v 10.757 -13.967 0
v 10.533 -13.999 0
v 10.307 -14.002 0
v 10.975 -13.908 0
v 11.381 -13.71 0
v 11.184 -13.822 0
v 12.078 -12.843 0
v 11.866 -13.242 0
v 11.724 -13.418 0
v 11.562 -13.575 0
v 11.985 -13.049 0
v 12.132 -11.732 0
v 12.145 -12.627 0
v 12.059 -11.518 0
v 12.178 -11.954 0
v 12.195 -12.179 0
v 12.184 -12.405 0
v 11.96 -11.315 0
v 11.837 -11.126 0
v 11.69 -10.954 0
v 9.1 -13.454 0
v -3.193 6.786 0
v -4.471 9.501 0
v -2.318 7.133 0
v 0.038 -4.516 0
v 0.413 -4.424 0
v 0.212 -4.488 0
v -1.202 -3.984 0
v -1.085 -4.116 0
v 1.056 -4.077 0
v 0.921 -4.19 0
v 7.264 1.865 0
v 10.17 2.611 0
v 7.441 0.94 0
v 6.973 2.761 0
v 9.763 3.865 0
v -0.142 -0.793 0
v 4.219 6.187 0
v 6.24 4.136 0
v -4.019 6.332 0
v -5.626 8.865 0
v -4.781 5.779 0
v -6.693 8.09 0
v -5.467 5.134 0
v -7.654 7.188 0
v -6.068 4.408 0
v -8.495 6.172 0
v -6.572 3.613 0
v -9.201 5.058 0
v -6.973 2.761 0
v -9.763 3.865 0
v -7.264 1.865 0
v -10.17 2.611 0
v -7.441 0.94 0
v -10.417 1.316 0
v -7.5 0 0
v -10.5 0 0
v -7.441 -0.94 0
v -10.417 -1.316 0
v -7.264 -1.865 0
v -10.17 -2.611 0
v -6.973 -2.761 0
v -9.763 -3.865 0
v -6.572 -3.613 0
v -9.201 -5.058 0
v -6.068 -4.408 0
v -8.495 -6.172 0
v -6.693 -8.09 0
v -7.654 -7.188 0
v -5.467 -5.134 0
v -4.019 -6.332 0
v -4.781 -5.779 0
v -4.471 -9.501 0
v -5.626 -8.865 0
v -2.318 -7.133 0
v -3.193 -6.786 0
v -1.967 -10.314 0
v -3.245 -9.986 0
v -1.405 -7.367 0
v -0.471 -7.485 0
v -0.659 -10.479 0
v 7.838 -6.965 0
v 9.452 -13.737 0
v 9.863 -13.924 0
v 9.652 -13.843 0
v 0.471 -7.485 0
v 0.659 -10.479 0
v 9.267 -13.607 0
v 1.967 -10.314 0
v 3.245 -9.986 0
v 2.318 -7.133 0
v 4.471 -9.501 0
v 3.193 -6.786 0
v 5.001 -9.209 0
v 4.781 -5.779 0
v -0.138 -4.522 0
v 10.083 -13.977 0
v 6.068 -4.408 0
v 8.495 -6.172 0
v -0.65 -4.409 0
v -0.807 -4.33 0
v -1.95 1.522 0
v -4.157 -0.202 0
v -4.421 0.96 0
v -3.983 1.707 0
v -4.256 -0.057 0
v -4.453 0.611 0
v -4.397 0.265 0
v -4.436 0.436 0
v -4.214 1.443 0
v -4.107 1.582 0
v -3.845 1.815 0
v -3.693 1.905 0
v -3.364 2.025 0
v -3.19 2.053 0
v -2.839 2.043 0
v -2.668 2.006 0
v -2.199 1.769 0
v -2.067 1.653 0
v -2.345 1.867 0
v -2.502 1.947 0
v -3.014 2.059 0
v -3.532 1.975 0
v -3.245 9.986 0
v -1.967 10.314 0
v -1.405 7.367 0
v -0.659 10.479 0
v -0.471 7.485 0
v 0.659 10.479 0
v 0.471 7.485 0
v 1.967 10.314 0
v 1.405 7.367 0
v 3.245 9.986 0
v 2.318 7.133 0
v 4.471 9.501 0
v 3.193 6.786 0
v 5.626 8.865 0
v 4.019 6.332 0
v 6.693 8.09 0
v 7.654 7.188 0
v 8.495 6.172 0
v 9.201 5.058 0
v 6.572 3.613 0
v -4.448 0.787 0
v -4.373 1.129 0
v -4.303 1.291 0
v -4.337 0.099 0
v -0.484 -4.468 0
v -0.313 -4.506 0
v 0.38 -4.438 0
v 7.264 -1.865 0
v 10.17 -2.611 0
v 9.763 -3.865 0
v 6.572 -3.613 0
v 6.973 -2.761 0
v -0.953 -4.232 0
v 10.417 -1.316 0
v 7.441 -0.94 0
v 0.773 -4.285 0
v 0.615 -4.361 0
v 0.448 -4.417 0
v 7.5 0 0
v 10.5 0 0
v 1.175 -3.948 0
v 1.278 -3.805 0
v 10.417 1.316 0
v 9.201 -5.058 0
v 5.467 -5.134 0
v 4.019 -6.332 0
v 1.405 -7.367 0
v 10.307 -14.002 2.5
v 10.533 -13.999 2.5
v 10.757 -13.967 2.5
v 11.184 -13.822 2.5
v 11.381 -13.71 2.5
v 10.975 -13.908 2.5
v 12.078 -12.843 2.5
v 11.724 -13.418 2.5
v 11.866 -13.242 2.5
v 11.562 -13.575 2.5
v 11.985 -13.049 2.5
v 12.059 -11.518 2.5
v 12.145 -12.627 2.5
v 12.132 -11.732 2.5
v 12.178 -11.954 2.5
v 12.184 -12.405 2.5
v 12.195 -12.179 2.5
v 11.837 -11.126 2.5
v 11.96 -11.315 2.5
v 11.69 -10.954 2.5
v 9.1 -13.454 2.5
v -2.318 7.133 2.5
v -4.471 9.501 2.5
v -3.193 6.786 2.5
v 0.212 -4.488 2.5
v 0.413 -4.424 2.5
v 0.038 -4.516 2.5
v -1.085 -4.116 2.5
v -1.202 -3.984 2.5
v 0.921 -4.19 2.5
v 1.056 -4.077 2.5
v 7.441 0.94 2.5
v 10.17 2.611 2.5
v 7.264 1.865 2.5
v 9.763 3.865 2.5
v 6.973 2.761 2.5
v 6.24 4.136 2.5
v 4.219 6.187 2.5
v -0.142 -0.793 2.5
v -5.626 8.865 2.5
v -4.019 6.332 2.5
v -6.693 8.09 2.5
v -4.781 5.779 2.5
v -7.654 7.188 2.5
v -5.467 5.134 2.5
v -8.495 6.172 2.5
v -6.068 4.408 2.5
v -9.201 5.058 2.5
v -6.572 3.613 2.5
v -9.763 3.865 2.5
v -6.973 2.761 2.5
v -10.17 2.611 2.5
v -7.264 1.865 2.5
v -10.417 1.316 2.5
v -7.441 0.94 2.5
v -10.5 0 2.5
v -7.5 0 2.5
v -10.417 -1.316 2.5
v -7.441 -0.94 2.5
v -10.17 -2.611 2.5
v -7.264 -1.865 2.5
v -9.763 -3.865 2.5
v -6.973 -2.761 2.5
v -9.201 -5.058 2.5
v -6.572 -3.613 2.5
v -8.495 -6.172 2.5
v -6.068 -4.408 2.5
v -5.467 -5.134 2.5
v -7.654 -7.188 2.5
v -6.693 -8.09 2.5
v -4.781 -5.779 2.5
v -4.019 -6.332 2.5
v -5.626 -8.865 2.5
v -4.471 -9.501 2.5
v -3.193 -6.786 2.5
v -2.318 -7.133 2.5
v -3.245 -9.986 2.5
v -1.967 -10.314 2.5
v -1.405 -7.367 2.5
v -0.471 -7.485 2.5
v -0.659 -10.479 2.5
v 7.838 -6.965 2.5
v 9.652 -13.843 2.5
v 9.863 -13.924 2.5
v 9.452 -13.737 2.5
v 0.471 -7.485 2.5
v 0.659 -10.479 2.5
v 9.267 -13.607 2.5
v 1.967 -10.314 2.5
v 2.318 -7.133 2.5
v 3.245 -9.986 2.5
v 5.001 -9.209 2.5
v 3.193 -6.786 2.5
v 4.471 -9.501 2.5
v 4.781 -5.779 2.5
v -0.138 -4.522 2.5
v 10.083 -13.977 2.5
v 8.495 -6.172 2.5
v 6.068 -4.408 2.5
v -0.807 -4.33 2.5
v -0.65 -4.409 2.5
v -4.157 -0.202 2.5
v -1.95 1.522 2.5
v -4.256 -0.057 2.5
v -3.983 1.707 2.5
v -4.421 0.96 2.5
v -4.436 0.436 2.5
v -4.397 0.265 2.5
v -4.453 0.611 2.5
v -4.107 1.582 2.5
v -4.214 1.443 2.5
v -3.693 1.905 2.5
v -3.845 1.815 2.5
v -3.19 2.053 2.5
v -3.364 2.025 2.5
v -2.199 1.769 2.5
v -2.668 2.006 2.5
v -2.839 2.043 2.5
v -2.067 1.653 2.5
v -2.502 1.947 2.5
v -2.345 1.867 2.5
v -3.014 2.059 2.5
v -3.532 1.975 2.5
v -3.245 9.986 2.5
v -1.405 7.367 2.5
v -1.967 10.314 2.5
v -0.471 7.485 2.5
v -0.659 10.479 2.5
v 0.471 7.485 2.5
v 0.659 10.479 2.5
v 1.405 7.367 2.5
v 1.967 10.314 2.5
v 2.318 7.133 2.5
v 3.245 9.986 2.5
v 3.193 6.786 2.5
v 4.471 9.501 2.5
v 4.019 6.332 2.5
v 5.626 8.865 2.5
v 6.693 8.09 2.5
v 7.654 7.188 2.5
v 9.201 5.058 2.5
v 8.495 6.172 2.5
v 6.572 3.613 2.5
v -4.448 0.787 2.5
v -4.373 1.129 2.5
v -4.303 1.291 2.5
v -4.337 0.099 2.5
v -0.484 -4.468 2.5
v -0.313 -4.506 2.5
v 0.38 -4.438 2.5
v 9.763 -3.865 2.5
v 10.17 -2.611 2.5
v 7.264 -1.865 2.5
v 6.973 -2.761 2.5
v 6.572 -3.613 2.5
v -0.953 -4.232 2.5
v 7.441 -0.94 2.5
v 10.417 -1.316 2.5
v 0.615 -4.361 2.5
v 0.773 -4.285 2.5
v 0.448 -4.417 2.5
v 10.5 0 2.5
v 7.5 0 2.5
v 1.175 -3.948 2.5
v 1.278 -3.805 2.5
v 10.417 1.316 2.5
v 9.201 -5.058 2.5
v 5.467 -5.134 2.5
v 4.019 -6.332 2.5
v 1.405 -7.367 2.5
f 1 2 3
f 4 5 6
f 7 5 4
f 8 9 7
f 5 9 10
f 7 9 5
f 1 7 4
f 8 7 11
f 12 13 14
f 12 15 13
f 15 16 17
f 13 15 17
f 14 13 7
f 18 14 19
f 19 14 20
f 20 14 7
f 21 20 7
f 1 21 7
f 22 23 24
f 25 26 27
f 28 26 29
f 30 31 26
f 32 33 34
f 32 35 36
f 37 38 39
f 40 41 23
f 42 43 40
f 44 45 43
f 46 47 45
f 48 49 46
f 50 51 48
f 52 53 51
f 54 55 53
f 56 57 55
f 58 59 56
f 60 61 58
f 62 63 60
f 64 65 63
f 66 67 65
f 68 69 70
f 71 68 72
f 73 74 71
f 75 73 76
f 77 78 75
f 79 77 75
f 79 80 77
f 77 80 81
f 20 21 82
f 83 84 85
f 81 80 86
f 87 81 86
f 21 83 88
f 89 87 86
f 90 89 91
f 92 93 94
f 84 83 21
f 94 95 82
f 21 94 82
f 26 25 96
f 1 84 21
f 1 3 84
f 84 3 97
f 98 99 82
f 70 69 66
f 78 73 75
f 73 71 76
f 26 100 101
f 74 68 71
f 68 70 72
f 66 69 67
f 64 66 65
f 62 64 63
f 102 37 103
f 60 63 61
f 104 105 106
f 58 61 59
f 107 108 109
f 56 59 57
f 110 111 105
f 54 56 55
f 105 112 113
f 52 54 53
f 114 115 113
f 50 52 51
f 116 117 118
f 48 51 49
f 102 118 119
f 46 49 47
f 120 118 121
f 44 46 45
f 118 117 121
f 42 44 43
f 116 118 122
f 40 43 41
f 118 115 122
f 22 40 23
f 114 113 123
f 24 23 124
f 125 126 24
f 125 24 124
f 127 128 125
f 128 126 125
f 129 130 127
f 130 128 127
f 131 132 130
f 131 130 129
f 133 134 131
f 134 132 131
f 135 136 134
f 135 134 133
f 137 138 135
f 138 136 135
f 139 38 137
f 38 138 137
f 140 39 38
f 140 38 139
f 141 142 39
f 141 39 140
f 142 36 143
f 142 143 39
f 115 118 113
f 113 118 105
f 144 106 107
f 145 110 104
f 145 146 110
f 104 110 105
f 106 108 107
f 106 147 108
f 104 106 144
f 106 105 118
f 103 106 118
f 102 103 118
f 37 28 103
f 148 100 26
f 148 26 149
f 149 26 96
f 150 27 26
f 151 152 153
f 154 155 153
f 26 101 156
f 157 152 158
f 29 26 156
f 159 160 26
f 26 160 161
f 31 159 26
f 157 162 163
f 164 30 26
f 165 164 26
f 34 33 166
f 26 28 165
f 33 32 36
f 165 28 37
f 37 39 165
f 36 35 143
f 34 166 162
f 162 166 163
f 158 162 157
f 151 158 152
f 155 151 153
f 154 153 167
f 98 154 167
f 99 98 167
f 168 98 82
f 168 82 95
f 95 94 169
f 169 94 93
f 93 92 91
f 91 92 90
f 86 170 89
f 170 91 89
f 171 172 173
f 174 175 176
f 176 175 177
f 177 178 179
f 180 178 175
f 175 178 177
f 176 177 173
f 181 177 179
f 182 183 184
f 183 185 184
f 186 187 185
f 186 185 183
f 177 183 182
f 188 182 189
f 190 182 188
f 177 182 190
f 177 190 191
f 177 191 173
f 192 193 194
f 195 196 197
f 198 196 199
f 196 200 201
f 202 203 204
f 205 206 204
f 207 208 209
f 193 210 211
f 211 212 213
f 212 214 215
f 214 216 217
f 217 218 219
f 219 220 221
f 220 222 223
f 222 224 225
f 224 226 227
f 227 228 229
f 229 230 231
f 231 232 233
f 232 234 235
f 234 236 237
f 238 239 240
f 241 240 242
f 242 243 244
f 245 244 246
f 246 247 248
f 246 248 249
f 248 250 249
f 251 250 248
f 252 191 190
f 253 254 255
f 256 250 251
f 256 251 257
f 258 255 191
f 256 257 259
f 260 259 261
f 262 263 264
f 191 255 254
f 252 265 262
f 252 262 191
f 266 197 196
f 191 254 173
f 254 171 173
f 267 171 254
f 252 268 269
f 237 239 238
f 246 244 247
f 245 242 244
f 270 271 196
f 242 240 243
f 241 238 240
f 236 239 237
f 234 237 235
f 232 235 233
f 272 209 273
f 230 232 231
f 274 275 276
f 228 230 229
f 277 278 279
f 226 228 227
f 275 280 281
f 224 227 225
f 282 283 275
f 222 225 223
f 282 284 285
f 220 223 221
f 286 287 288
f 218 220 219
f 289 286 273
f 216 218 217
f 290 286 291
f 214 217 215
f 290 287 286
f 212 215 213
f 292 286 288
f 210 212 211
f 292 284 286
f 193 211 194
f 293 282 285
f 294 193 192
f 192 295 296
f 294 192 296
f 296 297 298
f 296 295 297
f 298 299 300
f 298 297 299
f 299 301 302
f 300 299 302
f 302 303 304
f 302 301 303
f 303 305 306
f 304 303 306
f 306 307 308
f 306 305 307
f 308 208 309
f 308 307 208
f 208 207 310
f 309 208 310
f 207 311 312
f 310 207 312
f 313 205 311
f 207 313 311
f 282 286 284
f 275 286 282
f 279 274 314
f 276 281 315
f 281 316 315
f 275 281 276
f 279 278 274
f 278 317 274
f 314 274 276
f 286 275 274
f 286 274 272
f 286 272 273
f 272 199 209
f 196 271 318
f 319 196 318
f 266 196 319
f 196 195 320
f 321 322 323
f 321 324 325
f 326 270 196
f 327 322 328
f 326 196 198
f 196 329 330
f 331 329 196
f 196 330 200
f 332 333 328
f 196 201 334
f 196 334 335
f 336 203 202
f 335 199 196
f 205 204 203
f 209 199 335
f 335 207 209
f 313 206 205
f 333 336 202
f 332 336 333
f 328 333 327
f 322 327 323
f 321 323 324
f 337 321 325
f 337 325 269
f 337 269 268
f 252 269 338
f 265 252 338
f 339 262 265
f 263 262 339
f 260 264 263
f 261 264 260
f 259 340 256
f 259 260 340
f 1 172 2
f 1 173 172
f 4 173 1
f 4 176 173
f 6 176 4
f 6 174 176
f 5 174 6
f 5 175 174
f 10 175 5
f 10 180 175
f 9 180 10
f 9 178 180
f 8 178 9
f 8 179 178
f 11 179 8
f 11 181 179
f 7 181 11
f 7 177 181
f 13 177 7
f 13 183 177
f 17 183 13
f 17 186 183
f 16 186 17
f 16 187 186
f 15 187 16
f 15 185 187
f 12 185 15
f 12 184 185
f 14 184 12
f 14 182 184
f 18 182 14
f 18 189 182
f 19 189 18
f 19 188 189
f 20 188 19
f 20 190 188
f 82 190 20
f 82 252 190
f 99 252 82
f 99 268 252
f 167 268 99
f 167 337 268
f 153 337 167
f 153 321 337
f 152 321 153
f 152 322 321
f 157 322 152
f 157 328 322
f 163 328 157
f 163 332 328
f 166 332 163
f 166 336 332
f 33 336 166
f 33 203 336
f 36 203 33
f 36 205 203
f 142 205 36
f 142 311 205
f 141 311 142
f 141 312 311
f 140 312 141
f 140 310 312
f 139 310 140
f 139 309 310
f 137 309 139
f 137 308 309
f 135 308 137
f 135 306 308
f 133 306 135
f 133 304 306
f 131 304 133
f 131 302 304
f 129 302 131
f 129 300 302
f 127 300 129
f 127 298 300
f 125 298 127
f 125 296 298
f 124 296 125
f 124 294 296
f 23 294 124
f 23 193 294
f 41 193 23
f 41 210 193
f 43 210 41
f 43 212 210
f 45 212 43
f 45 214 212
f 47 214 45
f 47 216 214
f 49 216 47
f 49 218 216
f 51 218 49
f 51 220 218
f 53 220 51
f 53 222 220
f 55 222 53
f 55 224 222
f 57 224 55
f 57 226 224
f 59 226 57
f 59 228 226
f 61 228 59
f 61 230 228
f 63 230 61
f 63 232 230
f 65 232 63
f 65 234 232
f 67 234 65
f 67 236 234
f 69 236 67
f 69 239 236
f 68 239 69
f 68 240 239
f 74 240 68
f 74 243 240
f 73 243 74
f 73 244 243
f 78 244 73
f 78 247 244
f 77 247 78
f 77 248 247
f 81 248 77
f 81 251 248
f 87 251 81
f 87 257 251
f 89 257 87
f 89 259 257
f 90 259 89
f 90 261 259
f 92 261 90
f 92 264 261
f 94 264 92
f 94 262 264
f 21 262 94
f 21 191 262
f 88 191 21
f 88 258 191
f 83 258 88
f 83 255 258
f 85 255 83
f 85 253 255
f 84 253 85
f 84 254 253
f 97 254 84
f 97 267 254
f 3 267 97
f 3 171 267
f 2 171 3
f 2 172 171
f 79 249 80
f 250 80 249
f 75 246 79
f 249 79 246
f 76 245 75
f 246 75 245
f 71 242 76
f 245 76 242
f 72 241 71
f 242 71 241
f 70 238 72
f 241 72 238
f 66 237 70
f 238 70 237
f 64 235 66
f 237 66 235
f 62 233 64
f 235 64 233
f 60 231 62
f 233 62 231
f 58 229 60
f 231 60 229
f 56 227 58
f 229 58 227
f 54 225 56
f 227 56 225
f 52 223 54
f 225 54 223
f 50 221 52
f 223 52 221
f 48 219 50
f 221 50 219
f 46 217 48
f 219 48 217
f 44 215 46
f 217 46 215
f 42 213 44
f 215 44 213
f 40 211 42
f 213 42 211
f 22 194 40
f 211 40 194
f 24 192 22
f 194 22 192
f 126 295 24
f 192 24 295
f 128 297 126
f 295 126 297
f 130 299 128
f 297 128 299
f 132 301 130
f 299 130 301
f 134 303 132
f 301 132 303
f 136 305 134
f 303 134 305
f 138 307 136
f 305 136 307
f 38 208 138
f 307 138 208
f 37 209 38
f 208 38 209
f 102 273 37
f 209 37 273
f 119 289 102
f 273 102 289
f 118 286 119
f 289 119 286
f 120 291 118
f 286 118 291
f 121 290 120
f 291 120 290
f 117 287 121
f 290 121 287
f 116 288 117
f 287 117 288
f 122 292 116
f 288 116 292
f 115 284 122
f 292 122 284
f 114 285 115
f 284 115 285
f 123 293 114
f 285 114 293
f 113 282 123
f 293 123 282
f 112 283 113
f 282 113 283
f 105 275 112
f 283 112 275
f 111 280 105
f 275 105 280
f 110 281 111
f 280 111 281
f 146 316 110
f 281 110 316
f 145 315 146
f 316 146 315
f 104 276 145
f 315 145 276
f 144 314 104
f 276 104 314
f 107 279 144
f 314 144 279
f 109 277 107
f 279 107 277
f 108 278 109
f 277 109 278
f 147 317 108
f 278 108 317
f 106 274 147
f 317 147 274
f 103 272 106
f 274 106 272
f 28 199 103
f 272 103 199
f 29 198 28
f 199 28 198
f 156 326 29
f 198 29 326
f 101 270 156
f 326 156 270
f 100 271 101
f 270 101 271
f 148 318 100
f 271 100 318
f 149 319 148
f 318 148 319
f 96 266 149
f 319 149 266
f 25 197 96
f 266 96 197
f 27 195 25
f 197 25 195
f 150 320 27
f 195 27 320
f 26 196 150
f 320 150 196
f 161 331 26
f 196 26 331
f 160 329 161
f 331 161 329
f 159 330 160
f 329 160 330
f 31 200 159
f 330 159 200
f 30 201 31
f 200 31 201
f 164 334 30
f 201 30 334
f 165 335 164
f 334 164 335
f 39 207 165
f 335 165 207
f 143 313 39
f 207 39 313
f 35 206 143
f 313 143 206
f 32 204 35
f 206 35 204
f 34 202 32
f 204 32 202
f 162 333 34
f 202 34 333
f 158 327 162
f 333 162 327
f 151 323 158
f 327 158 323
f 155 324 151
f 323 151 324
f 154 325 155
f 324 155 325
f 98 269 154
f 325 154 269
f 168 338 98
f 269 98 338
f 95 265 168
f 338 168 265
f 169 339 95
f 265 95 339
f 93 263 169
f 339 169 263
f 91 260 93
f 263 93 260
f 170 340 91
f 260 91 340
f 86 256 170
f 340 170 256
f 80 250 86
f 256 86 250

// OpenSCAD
$fn = 50;

linear_extrude(2.5) {
    union () {
        // Ring 
        difference() {
            circle(10.5);
            circle(7.5);
        }
        
        // Inner mark
        rotate([0, 0, 148]) {
            translate([-1.7, -3, 0]) {
                minkowski() {
                    circle(1.4);
                    square([0.0001, 11.1], true);
                }
            }
        }
        
        rotate([0, 0, -142]) {
            translate([2, 0, 0]) {
                minkowski() {
                    circle(1.4);
                    square([0.0001, 4.8], true);
                }
            }
        }
       
        // Tail
        rotate([0, 0, -136]) {
            translate([1, 13, 0]) {
                minkowski() {
                    circle(1.8);
                    square([0.0001, 6], true);  
                }
            }  
        }
    }
}
